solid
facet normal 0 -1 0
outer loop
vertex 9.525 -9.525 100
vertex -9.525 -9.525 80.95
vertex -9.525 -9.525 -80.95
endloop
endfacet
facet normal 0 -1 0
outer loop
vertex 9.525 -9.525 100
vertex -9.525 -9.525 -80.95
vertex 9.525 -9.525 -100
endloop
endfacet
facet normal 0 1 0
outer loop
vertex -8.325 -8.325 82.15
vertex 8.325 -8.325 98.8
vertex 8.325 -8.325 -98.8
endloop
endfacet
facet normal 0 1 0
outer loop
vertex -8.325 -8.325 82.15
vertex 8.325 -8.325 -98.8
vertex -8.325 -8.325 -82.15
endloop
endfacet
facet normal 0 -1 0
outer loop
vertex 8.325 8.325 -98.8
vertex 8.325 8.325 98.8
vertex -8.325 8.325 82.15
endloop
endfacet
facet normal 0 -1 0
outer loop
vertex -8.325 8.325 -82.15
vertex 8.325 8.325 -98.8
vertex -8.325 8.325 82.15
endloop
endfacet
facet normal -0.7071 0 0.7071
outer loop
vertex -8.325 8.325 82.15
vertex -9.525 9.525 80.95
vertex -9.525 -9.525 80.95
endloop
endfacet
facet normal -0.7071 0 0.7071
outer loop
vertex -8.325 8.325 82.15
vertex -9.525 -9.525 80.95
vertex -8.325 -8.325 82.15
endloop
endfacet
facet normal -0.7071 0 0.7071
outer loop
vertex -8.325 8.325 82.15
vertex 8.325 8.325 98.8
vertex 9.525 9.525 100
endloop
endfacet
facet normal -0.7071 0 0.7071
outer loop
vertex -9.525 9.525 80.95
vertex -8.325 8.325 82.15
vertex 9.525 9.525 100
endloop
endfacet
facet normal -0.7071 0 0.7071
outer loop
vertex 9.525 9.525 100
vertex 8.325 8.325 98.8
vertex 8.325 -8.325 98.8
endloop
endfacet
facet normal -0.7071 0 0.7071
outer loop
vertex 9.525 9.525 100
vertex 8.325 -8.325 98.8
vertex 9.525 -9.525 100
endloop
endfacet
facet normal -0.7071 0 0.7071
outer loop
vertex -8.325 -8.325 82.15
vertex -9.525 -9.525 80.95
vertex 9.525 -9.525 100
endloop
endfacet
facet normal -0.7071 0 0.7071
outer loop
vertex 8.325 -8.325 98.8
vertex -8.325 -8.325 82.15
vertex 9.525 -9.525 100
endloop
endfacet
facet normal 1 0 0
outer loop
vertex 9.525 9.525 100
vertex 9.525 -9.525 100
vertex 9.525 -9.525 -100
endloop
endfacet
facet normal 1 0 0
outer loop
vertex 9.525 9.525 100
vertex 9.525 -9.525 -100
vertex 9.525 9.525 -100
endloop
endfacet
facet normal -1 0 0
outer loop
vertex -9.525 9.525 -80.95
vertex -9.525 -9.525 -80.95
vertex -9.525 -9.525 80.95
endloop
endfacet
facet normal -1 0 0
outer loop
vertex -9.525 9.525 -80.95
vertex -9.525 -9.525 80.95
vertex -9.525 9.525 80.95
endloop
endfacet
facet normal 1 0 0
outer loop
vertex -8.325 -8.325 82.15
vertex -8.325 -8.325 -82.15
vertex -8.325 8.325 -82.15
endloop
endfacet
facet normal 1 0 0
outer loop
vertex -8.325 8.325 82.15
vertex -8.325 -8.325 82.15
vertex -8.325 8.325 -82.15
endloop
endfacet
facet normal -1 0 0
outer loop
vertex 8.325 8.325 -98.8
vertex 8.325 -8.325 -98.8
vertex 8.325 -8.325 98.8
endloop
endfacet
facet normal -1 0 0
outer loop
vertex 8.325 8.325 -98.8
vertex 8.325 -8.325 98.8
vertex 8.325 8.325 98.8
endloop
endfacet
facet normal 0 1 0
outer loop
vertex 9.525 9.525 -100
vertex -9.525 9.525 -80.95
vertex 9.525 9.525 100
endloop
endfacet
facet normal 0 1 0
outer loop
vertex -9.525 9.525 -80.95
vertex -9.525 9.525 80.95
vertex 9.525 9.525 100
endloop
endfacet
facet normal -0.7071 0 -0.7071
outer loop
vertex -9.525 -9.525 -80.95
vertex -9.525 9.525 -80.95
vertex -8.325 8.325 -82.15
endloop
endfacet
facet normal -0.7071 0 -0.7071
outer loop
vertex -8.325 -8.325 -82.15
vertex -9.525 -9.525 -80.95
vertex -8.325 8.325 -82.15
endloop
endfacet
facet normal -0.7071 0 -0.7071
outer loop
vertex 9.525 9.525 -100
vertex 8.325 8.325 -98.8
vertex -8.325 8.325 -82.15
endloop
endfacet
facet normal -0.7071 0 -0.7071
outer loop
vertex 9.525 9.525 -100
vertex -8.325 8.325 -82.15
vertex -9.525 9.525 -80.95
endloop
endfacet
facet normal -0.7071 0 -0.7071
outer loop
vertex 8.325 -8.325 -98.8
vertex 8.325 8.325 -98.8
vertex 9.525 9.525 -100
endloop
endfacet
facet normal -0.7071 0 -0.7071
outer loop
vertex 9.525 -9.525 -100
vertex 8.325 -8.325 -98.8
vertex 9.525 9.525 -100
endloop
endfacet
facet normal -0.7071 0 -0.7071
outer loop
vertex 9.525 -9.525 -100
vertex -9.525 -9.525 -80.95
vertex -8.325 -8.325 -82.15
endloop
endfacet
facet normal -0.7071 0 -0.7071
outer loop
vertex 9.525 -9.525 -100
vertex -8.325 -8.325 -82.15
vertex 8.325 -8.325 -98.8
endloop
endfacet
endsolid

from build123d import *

# Parameters (mm, degrees)
SKETCH3_W               = 19.05
SKETCH3_H               = 19.05
BOSS_EXTRUDE1_DEPTH     = 100
SKETCH5_W               = 16.65
SKETCH5_H               = 16.65
CUT_EXTRUDE1_DEPTH      = 201.453114842
CUT_EXTRUDE2_DEPTH      = 101.903177601
CUT_EXTRUDE2_DEPTH_BACK = 101.903177601


with BuildPart() as part:
    # Sketch3 → Boss-Extrude1 (new, symmetric)
    with BuildSketch(Plane.XY):
        Rectangle(SKETCH3_W, SKETCH3_H)
    extrude(amount=BOSS_EXTRUDE1_DEPTH, both=True)

    # Sketch5 → Cut-Extrude1 (cut, through all)
    with BuildSketch(Plane(origin=(0, 0, -100), x_dir=(-1, 0, 0), z_dir=(0, 0, -1))):
        Rectangle(SKETCH5_W, SKETCH5_H)
    extrude(amount=-CUT_EXTRUDE1_DEPTH, mode=Mode.SUBTRACT)

    # Sketch7 → Cut-Extrude2 (cut, two sides: drawn at the far end of the back side and taken through both)
    with BuildSketch(Plane(origin=(0, 0, 0), x_dir=(1, 0, 0), z_dir=(0, 1, 0)).offset(-CUT_EXTRUDE2_DEPTH_BACK)):
        Polygon((9.525, 100), (-9.525, 100), (-9.525, 80.95), align=None)
        Polygon((-9.525, -80.95), (9.525, -100), (-9.525, -100), align=None)
    extrude(amount=CUT_EXTRUDE2_DEPTH + CUT_EXTRUDE2_DEPTH_BACK, mode=Mode.SUBTRACT)


solid = part.part
